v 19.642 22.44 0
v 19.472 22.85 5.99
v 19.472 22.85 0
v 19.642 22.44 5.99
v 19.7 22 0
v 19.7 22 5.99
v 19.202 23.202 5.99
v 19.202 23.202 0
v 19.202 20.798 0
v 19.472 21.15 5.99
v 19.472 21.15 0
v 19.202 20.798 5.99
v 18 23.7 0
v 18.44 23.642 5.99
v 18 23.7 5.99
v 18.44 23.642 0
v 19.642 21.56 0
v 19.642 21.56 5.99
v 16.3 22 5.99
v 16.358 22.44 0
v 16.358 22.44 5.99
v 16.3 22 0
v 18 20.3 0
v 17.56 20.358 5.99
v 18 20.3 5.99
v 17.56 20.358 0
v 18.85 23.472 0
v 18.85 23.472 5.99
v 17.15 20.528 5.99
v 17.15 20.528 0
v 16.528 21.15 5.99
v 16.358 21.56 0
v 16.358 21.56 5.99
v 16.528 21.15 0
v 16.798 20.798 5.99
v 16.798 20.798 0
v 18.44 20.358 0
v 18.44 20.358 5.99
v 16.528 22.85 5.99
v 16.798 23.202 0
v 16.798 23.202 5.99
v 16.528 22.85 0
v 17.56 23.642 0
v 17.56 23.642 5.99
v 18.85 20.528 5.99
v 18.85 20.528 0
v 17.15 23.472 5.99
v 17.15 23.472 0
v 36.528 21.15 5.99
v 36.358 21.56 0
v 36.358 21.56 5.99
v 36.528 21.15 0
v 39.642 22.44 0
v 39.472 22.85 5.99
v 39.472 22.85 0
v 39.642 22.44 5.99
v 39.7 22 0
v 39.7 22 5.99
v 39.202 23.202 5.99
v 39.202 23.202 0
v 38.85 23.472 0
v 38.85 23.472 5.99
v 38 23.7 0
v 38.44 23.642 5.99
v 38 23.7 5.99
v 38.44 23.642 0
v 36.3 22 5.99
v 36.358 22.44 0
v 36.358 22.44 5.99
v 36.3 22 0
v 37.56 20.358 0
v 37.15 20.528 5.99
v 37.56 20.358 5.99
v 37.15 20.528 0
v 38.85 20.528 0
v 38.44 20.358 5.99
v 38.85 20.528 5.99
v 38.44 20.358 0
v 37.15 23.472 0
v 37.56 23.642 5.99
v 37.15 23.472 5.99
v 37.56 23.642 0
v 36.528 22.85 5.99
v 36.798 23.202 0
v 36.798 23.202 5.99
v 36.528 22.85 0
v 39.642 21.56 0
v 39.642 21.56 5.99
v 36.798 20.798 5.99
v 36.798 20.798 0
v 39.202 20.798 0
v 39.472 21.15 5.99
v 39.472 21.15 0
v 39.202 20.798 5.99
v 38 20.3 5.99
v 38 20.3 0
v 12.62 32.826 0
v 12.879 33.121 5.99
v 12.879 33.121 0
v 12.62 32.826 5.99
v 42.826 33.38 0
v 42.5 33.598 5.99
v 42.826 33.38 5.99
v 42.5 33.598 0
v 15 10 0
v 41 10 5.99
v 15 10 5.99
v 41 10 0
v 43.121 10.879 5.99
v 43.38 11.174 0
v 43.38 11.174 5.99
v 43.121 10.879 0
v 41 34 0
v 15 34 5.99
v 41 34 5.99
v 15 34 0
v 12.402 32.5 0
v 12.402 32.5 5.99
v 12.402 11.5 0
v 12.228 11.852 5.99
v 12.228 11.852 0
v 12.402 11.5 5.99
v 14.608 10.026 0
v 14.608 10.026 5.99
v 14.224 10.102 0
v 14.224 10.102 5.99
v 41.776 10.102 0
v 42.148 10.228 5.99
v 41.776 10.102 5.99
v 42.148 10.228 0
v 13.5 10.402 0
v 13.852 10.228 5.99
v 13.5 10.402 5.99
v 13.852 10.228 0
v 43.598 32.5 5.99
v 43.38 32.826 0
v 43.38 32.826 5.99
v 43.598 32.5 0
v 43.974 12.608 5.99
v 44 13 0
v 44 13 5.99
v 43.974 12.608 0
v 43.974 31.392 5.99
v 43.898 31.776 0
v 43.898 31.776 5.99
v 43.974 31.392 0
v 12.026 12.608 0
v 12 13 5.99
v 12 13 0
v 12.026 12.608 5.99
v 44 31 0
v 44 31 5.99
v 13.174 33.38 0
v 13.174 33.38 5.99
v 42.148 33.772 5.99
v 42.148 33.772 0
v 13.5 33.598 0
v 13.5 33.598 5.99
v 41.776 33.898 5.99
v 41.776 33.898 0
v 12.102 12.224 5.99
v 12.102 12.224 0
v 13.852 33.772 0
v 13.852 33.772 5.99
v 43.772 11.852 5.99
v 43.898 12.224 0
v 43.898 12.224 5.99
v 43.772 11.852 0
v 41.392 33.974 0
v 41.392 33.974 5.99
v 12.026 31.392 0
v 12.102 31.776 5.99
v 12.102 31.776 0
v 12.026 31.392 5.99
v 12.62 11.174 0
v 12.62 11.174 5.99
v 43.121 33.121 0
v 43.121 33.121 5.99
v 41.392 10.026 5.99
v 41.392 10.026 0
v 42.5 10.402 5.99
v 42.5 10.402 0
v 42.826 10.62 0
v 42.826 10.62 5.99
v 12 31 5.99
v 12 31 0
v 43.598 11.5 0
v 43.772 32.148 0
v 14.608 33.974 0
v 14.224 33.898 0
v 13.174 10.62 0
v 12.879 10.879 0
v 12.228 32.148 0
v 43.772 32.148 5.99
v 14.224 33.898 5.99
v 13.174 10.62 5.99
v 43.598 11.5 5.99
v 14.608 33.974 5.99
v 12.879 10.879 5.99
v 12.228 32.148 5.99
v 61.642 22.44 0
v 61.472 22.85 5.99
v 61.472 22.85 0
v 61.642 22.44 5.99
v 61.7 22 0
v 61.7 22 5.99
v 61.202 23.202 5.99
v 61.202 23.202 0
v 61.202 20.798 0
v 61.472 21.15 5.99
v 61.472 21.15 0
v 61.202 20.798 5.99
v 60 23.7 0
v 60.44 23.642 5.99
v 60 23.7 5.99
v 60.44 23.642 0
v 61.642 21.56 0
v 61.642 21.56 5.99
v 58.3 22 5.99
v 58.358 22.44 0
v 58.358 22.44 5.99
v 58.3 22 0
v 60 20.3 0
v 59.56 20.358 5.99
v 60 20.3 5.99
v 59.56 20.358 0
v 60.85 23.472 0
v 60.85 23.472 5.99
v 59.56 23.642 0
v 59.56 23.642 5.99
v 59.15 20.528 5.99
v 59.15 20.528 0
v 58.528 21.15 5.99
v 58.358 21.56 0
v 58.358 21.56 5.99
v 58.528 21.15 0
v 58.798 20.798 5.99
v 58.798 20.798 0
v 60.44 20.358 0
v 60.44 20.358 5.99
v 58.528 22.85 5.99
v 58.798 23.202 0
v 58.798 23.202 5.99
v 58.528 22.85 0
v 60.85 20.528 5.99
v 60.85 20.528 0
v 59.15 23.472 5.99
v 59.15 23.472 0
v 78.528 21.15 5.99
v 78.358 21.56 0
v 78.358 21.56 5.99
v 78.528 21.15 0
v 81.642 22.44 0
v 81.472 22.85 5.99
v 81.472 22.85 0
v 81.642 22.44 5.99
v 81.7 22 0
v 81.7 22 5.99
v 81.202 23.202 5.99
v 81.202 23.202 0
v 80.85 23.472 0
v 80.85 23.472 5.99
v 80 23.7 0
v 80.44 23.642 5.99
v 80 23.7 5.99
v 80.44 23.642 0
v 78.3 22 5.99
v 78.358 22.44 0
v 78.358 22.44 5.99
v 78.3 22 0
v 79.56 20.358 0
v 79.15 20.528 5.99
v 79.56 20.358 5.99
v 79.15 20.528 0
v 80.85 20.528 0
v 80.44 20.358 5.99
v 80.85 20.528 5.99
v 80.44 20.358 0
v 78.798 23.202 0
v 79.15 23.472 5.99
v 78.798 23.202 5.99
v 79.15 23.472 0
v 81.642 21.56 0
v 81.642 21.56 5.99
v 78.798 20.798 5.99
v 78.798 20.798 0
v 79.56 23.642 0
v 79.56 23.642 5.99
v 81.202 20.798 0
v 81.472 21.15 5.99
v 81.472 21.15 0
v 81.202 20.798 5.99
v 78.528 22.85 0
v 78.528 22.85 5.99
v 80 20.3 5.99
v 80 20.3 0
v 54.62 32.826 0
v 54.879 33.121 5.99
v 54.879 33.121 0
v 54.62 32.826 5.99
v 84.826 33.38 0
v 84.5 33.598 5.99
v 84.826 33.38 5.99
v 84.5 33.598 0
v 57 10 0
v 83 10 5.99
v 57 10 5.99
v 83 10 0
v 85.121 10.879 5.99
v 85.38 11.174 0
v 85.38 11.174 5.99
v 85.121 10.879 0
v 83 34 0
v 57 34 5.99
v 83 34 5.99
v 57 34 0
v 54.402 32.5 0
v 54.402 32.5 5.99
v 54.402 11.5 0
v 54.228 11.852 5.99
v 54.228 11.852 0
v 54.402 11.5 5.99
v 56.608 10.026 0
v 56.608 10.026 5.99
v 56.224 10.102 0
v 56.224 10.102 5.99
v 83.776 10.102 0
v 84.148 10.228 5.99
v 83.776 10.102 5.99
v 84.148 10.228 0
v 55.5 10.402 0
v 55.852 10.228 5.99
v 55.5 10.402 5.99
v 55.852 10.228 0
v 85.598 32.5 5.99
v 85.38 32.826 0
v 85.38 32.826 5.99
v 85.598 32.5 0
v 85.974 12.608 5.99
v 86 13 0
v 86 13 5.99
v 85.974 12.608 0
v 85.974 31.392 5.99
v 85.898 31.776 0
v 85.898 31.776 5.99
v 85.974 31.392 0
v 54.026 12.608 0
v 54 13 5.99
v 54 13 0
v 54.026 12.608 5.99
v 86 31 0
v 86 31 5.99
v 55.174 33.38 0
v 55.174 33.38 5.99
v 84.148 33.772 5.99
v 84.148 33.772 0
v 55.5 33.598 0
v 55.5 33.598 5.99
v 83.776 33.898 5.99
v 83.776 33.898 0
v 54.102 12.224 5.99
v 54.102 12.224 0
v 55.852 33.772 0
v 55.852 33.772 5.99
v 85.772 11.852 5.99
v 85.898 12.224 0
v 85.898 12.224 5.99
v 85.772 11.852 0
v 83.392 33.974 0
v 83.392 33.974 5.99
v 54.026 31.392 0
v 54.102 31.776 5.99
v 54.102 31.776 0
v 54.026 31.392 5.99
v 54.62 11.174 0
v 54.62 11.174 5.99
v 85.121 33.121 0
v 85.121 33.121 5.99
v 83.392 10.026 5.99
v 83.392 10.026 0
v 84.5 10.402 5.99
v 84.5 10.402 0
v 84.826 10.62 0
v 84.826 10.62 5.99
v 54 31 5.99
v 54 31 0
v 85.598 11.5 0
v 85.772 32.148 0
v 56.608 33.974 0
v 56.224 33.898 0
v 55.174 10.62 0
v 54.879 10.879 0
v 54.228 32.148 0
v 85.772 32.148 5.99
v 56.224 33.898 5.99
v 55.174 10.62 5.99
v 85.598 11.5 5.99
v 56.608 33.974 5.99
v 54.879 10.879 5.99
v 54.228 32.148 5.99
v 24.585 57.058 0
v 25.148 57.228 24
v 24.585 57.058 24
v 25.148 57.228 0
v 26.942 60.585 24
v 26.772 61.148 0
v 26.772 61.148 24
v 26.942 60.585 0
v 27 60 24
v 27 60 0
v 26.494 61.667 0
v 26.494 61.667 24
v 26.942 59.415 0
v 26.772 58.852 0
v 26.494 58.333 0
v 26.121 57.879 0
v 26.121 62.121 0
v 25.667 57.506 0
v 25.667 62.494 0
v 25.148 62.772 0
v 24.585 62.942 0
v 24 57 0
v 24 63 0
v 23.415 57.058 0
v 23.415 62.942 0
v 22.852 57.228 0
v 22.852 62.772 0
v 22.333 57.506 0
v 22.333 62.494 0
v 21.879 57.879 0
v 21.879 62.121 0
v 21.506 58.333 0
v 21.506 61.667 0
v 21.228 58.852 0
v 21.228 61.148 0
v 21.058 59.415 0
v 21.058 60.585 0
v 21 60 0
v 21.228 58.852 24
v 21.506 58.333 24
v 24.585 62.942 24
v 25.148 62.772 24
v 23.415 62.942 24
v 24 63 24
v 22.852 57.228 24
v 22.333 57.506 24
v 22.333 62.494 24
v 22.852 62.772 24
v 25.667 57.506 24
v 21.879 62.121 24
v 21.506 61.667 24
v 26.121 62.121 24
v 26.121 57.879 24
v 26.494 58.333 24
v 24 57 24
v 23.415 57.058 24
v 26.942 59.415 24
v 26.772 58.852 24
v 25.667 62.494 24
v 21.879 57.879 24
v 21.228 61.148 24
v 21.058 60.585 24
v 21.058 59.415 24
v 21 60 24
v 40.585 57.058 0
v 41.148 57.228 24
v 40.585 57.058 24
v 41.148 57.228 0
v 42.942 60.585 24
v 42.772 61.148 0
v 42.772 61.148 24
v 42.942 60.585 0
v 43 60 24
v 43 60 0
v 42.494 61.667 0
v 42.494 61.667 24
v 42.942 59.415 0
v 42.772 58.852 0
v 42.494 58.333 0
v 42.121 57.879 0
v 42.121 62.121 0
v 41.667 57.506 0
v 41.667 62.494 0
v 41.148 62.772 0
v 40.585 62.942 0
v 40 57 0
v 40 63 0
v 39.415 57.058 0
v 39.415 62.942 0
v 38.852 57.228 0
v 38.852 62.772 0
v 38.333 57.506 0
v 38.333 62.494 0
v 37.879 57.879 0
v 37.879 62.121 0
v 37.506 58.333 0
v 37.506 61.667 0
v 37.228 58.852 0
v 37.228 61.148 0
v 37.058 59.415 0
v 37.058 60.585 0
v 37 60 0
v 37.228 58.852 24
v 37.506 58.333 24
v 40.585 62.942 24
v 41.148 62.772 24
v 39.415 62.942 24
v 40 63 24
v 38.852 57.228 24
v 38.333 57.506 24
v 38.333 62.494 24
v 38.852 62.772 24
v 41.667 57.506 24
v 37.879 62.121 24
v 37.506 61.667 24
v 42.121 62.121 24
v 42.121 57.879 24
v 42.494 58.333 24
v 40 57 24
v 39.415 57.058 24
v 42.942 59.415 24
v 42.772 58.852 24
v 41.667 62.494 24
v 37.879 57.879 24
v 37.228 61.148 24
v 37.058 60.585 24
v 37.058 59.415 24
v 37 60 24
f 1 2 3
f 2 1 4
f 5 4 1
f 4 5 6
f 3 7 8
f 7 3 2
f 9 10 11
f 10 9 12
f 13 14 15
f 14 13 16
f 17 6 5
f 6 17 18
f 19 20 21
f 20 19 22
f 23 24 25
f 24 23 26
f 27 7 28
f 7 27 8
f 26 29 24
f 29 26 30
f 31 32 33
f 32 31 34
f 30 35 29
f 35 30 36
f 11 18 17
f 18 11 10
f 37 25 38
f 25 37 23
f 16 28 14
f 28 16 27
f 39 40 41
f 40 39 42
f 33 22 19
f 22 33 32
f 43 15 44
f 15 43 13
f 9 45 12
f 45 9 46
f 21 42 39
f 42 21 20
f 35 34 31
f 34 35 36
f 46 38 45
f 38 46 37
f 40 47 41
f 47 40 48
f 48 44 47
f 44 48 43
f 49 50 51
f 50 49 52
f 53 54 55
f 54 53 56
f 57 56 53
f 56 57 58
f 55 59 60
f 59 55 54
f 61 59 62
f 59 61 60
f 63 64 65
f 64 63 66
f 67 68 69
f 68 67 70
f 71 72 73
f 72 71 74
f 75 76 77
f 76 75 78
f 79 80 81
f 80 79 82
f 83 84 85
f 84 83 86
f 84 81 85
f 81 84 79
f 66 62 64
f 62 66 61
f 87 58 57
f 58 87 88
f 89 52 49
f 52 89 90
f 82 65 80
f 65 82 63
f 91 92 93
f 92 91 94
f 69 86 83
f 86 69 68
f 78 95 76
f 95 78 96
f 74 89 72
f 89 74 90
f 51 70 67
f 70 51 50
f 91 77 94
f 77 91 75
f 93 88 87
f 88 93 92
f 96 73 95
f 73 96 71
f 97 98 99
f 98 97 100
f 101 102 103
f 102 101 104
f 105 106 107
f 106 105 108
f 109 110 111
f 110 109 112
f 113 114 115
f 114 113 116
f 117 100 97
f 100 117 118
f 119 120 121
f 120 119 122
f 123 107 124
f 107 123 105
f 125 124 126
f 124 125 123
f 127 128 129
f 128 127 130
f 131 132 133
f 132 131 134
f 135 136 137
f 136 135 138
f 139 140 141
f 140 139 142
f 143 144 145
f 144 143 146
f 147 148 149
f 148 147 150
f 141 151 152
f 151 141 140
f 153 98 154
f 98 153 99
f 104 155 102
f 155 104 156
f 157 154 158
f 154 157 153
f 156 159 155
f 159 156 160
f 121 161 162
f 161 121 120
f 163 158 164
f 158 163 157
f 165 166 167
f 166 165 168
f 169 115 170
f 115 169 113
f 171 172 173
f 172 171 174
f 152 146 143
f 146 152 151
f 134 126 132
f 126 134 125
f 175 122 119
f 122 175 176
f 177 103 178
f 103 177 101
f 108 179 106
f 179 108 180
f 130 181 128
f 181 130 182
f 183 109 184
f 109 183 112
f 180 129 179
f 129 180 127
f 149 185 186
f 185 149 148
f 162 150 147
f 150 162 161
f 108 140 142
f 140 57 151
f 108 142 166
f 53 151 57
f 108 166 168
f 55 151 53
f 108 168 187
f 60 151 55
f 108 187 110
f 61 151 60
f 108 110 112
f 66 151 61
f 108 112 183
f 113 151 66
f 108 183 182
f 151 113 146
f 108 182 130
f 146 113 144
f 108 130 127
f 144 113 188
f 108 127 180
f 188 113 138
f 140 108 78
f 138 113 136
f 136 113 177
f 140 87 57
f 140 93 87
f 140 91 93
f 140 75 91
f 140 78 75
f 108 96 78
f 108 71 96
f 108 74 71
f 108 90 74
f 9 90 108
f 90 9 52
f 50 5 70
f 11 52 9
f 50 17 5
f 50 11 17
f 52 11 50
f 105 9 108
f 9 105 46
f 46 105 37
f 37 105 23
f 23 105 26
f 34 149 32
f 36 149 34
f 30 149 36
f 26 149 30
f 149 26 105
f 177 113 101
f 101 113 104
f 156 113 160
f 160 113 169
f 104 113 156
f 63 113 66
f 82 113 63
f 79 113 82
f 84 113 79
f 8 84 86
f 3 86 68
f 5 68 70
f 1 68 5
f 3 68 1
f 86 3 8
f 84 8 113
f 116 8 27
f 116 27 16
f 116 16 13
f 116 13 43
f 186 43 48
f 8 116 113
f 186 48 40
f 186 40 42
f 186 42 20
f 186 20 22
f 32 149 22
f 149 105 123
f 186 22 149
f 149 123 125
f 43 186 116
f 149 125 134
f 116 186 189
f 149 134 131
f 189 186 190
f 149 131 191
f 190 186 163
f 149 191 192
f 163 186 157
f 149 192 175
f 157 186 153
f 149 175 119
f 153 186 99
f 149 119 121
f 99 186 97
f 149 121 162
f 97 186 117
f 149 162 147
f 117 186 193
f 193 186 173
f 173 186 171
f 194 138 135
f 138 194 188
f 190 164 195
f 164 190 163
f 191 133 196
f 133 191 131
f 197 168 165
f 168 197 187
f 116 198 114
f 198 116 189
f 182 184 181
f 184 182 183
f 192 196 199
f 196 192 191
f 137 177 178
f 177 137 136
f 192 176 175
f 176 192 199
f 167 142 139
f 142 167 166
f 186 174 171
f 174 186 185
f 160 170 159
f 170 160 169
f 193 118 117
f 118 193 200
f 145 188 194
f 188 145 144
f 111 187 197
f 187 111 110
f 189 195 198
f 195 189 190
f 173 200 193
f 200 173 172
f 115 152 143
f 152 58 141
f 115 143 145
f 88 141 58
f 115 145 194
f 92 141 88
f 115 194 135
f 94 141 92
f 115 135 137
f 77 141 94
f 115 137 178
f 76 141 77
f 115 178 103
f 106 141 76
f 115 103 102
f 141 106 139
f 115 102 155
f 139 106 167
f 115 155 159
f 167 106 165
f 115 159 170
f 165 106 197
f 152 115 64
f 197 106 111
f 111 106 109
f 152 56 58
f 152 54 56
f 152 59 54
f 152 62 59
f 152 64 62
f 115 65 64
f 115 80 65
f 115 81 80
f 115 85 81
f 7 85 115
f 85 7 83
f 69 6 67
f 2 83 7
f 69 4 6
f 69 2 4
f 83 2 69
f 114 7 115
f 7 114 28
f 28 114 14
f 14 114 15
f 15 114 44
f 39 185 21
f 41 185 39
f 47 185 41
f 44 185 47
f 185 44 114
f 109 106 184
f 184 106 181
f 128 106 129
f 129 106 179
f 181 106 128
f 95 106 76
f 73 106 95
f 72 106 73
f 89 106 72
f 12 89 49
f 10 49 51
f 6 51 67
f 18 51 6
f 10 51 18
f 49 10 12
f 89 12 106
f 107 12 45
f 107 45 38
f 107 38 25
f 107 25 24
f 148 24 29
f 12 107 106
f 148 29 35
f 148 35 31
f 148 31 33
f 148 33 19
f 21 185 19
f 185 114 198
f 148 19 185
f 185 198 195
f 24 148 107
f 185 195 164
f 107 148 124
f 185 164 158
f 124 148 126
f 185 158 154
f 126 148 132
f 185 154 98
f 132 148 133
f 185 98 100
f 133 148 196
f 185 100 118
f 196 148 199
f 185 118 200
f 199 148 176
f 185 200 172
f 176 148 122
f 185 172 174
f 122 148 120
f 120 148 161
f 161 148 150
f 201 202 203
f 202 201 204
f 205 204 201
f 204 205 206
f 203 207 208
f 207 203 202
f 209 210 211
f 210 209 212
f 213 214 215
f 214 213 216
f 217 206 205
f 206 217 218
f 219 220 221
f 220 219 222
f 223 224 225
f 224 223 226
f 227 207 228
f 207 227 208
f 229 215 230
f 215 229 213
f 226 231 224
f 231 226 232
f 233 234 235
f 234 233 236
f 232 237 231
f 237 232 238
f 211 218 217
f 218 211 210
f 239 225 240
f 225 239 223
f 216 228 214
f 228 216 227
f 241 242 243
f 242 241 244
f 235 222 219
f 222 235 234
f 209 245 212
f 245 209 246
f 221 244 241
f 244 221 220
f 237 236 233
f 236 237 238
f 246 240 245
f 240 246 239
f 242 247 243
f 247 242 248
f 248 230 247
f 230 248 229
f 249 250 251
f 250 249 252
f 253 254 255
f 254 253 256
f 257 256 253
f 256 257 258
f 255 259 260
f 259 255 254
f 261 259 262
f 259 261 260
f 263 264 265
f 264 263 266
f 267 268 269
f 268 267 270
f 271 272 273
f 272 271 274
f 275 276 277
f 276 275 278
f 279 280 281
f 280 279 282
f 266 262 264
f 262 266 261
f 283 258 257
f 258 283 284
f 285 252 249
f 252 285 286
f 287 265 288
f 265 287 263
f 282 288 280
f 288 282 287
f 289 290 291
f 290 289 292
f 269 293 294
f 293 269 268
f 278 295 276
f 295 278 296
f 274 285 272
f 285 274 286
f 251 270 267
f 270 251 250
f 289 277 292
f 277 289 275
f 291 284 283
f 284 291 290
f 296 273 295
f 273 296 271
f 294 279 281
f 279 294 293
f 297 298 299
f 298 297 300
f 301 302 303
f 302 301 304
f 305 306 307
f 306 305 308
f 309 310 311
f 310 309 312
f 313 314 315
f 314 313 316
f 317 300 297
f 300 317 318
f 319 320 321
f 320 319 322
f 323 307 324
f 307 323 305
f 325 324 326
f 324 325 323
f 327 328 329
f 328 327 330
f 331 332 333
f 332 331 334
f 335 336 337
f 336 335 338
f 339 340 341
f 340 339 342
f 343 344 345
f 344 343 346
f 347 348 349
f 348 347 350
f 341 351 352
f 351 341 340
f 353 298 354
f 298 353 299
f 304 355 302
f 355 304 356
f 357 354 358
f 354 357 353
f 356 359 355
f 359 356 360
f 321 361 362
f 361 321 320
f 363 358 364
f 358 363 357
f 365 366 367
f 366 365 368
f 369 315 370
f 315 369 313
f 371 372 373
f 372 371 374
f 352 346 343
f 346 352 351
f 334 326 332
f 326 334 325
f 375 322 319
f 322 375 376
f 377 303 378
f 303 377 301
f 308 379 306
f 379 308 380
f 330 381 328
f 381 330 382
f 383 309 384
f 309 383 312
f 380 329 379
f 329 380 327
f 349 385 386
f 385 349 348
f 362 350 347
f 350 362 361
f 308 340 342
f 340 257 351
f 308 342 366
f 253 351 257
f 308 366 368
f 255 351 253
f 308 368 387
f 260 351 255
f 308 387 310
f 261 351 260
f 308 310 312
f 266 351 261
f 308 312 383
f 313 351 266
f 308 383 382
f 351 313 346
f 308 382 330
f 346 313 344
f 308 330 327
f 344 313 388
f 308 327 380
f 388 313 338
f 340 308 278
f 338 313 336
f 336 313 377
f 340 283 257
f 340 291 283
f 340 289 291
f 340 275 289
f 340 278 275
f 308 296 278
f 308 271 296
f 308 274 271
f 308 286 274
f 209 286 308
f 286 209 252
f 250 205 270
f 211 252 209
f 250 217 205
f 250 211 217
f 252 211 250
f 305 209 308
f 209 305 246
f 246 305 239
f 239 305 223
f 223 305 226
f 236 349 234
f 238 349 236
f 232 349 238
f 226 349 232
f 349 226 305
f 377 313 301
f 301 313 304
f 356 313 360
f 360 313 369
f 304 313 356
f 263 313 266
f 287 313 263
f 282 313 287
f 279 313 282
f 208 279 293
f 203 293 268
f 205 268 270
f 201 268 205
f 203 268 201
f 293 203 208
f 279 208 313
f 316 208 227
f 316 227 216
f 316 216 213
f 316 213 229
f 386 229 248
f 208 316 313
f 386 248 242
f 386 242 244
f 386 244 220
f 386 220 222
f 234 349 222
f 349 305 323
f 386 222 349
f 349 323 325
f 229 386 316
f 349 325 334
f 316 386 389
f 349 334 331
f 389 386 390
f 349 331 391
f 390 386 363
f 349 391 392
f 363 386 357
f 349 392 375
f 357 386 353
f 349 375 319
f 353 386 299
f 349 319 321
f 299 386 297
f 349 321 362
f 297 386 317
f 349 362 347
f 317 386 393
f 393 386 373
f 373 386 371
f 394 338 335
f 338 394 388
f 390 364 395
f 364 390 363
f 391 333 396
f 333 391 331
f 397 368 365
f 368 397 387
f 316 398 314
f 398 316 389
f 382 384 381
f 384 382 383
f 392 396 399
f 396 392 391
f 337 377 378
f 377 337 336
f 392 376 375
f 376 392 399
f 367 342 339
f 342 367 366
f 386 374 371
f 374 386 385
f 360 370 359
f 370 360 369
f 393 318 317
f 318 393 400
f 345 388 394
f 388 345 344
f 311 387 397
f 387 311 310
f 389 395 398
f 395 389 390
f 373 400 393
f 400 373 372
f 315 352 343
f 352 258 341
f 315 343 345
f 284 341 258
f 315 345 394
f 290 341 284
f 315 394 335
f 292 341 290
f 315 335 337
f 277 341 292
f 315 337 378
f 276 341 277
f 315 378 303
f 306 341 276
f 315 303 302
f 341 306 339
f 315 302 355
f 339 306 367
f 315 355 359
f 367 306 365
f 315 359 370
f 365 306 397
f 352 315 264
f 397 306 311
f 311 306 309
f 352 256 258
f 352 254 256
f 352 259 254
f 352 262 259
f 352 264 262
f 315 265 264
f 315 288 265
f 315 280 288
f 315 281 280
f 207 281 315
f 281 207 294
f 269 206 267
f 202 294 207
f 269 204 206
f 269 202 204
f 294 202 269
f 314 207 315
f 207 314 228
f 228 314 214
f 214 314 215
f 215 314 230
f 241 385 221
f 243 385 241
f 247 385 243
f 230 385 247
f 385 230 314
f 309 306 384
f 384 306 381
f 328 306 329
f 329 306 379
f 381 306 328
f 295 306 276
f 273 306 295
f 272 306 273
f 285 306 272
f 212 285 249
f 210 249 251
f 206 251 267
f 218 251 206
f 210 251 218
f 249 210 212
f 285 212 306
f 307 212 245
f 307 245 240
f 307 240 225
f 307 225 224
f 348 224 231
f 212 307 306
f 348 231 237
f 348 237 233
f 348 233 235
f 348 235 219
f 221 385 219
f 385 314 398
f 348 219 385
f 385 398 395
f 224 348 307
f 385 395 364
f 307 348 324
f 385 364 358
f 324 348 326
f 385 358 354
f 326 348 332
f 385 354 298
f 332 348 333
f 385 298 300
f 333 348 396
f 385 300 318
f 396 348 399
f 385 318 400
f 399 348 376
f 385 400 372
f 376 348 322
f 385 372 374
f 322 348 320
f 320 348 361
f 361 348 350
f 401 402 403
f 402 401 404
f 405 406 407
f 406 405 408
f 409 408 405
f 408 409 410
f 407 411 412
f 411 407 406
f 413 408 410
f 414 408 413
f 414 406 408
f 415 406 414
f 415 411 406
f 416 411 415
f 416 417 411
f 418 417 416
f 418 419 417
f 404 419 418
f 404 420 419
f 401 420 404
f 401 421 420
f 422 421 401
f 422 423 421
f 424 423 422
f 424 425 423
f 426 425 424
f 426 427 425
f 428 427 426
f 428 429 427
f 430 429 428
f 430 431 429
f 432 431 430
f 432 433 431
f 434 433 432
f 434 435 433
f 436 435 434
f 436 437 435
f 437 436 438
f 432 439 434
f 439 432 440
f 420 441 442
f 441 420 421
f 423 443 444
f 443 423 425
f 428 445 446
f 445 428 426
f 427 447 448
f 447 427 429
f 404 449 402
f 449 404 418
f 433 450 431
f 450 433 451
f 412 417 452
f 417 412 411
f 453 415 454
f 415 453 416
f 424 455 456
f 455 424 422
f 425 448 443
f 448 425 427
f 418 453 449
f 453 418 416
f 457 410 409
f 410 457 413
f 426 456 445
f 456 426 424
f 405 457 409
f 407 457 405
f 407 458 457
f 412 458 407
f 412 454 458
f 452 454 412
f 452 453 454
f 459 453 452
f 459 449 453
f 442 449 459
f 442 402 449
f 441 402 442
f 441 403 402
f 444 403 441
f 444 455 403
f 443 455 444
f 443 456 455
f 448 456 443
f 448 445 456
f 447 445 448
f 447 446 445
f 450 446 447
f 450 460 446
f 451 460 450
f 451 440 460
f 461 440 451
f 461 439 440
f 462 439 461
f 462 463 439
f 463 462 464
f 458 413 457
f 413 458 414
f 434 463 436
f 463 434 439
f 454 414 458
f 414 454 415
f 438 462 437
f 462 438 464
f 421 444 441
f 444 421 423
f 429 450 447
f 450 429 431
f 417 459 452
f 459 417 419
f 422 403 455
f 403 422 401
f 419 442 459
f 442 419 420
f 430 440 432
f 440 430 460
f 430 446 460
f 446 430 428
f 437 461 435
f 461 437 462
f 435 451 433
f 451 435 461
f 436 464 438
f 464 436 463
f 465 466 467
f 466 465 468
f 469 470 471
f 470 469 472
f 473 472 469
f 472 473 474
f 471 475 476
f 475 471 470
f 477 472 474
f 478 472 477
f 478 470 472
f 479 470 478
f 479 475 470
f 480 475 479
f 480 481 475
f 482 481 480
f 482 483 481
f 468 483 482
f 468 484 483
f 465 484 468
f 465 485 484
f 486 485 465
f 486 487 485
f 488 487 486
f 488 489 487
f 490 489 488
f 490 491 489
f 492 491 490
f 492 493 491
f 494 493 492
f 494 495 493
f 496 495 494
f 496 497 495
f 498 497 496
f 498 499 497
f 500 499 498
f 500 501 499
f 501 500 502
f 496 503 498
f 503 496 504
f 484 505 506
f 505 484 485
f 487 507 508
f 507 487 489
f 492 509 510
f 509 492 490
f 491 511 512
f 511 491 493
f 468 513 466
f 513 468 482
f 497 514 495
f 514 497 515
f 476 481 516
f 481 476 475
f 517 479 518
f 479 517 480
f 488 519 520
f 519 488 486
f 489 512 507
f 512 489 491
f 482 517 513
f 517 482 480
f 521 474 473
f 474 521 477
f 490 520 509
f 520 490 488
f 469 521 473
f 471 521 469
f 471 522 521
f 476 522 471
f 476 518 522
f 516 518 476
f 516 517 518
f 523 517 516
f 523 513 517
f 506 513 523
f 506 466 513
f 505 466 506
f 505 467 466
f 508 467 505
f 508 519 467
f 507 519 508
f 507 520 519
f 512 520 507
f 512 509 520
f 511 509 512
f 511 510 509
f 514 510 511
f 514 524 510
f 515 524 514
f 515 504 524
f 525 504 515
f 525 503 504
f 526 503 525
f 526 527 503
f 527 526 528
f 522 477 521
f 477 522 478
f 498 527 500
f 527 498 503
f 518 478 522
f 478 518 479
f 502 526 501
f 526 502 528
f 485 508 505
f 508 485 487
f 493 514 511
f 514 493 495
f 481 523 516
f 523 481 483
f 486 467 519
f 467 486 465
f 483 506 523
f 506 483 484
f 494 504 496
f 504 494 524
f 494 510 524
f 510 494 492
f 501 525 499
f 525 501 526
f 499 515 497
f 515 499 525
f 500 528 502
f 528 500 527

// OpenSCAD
/*
Sample 111: Geteilte Wellen-Klemmkupplung — 6-mm-Welle
Generated from the FDM Mechanical Sample Library.
Units: millimetres.

Override examples:
  openscad -o custom.stl -D 'view="plate"' -D 'render_fn=64' model.scad
  openscad -o preview.png -D 'view="assembly"' model.scad
*/
use <../../../library/fdm_mechanisms.scad>

render_fn = is_undef(render_fn) ? 48 : render_fn;
view = is_undef(view) ? "plate" : view;
$fn = render_fn;

sample_shaft_coupler(
    view=view,
    bore_d=6,
    clearance=0.2,
    screw_d=3.4,
    nut_flat=5.7
);
